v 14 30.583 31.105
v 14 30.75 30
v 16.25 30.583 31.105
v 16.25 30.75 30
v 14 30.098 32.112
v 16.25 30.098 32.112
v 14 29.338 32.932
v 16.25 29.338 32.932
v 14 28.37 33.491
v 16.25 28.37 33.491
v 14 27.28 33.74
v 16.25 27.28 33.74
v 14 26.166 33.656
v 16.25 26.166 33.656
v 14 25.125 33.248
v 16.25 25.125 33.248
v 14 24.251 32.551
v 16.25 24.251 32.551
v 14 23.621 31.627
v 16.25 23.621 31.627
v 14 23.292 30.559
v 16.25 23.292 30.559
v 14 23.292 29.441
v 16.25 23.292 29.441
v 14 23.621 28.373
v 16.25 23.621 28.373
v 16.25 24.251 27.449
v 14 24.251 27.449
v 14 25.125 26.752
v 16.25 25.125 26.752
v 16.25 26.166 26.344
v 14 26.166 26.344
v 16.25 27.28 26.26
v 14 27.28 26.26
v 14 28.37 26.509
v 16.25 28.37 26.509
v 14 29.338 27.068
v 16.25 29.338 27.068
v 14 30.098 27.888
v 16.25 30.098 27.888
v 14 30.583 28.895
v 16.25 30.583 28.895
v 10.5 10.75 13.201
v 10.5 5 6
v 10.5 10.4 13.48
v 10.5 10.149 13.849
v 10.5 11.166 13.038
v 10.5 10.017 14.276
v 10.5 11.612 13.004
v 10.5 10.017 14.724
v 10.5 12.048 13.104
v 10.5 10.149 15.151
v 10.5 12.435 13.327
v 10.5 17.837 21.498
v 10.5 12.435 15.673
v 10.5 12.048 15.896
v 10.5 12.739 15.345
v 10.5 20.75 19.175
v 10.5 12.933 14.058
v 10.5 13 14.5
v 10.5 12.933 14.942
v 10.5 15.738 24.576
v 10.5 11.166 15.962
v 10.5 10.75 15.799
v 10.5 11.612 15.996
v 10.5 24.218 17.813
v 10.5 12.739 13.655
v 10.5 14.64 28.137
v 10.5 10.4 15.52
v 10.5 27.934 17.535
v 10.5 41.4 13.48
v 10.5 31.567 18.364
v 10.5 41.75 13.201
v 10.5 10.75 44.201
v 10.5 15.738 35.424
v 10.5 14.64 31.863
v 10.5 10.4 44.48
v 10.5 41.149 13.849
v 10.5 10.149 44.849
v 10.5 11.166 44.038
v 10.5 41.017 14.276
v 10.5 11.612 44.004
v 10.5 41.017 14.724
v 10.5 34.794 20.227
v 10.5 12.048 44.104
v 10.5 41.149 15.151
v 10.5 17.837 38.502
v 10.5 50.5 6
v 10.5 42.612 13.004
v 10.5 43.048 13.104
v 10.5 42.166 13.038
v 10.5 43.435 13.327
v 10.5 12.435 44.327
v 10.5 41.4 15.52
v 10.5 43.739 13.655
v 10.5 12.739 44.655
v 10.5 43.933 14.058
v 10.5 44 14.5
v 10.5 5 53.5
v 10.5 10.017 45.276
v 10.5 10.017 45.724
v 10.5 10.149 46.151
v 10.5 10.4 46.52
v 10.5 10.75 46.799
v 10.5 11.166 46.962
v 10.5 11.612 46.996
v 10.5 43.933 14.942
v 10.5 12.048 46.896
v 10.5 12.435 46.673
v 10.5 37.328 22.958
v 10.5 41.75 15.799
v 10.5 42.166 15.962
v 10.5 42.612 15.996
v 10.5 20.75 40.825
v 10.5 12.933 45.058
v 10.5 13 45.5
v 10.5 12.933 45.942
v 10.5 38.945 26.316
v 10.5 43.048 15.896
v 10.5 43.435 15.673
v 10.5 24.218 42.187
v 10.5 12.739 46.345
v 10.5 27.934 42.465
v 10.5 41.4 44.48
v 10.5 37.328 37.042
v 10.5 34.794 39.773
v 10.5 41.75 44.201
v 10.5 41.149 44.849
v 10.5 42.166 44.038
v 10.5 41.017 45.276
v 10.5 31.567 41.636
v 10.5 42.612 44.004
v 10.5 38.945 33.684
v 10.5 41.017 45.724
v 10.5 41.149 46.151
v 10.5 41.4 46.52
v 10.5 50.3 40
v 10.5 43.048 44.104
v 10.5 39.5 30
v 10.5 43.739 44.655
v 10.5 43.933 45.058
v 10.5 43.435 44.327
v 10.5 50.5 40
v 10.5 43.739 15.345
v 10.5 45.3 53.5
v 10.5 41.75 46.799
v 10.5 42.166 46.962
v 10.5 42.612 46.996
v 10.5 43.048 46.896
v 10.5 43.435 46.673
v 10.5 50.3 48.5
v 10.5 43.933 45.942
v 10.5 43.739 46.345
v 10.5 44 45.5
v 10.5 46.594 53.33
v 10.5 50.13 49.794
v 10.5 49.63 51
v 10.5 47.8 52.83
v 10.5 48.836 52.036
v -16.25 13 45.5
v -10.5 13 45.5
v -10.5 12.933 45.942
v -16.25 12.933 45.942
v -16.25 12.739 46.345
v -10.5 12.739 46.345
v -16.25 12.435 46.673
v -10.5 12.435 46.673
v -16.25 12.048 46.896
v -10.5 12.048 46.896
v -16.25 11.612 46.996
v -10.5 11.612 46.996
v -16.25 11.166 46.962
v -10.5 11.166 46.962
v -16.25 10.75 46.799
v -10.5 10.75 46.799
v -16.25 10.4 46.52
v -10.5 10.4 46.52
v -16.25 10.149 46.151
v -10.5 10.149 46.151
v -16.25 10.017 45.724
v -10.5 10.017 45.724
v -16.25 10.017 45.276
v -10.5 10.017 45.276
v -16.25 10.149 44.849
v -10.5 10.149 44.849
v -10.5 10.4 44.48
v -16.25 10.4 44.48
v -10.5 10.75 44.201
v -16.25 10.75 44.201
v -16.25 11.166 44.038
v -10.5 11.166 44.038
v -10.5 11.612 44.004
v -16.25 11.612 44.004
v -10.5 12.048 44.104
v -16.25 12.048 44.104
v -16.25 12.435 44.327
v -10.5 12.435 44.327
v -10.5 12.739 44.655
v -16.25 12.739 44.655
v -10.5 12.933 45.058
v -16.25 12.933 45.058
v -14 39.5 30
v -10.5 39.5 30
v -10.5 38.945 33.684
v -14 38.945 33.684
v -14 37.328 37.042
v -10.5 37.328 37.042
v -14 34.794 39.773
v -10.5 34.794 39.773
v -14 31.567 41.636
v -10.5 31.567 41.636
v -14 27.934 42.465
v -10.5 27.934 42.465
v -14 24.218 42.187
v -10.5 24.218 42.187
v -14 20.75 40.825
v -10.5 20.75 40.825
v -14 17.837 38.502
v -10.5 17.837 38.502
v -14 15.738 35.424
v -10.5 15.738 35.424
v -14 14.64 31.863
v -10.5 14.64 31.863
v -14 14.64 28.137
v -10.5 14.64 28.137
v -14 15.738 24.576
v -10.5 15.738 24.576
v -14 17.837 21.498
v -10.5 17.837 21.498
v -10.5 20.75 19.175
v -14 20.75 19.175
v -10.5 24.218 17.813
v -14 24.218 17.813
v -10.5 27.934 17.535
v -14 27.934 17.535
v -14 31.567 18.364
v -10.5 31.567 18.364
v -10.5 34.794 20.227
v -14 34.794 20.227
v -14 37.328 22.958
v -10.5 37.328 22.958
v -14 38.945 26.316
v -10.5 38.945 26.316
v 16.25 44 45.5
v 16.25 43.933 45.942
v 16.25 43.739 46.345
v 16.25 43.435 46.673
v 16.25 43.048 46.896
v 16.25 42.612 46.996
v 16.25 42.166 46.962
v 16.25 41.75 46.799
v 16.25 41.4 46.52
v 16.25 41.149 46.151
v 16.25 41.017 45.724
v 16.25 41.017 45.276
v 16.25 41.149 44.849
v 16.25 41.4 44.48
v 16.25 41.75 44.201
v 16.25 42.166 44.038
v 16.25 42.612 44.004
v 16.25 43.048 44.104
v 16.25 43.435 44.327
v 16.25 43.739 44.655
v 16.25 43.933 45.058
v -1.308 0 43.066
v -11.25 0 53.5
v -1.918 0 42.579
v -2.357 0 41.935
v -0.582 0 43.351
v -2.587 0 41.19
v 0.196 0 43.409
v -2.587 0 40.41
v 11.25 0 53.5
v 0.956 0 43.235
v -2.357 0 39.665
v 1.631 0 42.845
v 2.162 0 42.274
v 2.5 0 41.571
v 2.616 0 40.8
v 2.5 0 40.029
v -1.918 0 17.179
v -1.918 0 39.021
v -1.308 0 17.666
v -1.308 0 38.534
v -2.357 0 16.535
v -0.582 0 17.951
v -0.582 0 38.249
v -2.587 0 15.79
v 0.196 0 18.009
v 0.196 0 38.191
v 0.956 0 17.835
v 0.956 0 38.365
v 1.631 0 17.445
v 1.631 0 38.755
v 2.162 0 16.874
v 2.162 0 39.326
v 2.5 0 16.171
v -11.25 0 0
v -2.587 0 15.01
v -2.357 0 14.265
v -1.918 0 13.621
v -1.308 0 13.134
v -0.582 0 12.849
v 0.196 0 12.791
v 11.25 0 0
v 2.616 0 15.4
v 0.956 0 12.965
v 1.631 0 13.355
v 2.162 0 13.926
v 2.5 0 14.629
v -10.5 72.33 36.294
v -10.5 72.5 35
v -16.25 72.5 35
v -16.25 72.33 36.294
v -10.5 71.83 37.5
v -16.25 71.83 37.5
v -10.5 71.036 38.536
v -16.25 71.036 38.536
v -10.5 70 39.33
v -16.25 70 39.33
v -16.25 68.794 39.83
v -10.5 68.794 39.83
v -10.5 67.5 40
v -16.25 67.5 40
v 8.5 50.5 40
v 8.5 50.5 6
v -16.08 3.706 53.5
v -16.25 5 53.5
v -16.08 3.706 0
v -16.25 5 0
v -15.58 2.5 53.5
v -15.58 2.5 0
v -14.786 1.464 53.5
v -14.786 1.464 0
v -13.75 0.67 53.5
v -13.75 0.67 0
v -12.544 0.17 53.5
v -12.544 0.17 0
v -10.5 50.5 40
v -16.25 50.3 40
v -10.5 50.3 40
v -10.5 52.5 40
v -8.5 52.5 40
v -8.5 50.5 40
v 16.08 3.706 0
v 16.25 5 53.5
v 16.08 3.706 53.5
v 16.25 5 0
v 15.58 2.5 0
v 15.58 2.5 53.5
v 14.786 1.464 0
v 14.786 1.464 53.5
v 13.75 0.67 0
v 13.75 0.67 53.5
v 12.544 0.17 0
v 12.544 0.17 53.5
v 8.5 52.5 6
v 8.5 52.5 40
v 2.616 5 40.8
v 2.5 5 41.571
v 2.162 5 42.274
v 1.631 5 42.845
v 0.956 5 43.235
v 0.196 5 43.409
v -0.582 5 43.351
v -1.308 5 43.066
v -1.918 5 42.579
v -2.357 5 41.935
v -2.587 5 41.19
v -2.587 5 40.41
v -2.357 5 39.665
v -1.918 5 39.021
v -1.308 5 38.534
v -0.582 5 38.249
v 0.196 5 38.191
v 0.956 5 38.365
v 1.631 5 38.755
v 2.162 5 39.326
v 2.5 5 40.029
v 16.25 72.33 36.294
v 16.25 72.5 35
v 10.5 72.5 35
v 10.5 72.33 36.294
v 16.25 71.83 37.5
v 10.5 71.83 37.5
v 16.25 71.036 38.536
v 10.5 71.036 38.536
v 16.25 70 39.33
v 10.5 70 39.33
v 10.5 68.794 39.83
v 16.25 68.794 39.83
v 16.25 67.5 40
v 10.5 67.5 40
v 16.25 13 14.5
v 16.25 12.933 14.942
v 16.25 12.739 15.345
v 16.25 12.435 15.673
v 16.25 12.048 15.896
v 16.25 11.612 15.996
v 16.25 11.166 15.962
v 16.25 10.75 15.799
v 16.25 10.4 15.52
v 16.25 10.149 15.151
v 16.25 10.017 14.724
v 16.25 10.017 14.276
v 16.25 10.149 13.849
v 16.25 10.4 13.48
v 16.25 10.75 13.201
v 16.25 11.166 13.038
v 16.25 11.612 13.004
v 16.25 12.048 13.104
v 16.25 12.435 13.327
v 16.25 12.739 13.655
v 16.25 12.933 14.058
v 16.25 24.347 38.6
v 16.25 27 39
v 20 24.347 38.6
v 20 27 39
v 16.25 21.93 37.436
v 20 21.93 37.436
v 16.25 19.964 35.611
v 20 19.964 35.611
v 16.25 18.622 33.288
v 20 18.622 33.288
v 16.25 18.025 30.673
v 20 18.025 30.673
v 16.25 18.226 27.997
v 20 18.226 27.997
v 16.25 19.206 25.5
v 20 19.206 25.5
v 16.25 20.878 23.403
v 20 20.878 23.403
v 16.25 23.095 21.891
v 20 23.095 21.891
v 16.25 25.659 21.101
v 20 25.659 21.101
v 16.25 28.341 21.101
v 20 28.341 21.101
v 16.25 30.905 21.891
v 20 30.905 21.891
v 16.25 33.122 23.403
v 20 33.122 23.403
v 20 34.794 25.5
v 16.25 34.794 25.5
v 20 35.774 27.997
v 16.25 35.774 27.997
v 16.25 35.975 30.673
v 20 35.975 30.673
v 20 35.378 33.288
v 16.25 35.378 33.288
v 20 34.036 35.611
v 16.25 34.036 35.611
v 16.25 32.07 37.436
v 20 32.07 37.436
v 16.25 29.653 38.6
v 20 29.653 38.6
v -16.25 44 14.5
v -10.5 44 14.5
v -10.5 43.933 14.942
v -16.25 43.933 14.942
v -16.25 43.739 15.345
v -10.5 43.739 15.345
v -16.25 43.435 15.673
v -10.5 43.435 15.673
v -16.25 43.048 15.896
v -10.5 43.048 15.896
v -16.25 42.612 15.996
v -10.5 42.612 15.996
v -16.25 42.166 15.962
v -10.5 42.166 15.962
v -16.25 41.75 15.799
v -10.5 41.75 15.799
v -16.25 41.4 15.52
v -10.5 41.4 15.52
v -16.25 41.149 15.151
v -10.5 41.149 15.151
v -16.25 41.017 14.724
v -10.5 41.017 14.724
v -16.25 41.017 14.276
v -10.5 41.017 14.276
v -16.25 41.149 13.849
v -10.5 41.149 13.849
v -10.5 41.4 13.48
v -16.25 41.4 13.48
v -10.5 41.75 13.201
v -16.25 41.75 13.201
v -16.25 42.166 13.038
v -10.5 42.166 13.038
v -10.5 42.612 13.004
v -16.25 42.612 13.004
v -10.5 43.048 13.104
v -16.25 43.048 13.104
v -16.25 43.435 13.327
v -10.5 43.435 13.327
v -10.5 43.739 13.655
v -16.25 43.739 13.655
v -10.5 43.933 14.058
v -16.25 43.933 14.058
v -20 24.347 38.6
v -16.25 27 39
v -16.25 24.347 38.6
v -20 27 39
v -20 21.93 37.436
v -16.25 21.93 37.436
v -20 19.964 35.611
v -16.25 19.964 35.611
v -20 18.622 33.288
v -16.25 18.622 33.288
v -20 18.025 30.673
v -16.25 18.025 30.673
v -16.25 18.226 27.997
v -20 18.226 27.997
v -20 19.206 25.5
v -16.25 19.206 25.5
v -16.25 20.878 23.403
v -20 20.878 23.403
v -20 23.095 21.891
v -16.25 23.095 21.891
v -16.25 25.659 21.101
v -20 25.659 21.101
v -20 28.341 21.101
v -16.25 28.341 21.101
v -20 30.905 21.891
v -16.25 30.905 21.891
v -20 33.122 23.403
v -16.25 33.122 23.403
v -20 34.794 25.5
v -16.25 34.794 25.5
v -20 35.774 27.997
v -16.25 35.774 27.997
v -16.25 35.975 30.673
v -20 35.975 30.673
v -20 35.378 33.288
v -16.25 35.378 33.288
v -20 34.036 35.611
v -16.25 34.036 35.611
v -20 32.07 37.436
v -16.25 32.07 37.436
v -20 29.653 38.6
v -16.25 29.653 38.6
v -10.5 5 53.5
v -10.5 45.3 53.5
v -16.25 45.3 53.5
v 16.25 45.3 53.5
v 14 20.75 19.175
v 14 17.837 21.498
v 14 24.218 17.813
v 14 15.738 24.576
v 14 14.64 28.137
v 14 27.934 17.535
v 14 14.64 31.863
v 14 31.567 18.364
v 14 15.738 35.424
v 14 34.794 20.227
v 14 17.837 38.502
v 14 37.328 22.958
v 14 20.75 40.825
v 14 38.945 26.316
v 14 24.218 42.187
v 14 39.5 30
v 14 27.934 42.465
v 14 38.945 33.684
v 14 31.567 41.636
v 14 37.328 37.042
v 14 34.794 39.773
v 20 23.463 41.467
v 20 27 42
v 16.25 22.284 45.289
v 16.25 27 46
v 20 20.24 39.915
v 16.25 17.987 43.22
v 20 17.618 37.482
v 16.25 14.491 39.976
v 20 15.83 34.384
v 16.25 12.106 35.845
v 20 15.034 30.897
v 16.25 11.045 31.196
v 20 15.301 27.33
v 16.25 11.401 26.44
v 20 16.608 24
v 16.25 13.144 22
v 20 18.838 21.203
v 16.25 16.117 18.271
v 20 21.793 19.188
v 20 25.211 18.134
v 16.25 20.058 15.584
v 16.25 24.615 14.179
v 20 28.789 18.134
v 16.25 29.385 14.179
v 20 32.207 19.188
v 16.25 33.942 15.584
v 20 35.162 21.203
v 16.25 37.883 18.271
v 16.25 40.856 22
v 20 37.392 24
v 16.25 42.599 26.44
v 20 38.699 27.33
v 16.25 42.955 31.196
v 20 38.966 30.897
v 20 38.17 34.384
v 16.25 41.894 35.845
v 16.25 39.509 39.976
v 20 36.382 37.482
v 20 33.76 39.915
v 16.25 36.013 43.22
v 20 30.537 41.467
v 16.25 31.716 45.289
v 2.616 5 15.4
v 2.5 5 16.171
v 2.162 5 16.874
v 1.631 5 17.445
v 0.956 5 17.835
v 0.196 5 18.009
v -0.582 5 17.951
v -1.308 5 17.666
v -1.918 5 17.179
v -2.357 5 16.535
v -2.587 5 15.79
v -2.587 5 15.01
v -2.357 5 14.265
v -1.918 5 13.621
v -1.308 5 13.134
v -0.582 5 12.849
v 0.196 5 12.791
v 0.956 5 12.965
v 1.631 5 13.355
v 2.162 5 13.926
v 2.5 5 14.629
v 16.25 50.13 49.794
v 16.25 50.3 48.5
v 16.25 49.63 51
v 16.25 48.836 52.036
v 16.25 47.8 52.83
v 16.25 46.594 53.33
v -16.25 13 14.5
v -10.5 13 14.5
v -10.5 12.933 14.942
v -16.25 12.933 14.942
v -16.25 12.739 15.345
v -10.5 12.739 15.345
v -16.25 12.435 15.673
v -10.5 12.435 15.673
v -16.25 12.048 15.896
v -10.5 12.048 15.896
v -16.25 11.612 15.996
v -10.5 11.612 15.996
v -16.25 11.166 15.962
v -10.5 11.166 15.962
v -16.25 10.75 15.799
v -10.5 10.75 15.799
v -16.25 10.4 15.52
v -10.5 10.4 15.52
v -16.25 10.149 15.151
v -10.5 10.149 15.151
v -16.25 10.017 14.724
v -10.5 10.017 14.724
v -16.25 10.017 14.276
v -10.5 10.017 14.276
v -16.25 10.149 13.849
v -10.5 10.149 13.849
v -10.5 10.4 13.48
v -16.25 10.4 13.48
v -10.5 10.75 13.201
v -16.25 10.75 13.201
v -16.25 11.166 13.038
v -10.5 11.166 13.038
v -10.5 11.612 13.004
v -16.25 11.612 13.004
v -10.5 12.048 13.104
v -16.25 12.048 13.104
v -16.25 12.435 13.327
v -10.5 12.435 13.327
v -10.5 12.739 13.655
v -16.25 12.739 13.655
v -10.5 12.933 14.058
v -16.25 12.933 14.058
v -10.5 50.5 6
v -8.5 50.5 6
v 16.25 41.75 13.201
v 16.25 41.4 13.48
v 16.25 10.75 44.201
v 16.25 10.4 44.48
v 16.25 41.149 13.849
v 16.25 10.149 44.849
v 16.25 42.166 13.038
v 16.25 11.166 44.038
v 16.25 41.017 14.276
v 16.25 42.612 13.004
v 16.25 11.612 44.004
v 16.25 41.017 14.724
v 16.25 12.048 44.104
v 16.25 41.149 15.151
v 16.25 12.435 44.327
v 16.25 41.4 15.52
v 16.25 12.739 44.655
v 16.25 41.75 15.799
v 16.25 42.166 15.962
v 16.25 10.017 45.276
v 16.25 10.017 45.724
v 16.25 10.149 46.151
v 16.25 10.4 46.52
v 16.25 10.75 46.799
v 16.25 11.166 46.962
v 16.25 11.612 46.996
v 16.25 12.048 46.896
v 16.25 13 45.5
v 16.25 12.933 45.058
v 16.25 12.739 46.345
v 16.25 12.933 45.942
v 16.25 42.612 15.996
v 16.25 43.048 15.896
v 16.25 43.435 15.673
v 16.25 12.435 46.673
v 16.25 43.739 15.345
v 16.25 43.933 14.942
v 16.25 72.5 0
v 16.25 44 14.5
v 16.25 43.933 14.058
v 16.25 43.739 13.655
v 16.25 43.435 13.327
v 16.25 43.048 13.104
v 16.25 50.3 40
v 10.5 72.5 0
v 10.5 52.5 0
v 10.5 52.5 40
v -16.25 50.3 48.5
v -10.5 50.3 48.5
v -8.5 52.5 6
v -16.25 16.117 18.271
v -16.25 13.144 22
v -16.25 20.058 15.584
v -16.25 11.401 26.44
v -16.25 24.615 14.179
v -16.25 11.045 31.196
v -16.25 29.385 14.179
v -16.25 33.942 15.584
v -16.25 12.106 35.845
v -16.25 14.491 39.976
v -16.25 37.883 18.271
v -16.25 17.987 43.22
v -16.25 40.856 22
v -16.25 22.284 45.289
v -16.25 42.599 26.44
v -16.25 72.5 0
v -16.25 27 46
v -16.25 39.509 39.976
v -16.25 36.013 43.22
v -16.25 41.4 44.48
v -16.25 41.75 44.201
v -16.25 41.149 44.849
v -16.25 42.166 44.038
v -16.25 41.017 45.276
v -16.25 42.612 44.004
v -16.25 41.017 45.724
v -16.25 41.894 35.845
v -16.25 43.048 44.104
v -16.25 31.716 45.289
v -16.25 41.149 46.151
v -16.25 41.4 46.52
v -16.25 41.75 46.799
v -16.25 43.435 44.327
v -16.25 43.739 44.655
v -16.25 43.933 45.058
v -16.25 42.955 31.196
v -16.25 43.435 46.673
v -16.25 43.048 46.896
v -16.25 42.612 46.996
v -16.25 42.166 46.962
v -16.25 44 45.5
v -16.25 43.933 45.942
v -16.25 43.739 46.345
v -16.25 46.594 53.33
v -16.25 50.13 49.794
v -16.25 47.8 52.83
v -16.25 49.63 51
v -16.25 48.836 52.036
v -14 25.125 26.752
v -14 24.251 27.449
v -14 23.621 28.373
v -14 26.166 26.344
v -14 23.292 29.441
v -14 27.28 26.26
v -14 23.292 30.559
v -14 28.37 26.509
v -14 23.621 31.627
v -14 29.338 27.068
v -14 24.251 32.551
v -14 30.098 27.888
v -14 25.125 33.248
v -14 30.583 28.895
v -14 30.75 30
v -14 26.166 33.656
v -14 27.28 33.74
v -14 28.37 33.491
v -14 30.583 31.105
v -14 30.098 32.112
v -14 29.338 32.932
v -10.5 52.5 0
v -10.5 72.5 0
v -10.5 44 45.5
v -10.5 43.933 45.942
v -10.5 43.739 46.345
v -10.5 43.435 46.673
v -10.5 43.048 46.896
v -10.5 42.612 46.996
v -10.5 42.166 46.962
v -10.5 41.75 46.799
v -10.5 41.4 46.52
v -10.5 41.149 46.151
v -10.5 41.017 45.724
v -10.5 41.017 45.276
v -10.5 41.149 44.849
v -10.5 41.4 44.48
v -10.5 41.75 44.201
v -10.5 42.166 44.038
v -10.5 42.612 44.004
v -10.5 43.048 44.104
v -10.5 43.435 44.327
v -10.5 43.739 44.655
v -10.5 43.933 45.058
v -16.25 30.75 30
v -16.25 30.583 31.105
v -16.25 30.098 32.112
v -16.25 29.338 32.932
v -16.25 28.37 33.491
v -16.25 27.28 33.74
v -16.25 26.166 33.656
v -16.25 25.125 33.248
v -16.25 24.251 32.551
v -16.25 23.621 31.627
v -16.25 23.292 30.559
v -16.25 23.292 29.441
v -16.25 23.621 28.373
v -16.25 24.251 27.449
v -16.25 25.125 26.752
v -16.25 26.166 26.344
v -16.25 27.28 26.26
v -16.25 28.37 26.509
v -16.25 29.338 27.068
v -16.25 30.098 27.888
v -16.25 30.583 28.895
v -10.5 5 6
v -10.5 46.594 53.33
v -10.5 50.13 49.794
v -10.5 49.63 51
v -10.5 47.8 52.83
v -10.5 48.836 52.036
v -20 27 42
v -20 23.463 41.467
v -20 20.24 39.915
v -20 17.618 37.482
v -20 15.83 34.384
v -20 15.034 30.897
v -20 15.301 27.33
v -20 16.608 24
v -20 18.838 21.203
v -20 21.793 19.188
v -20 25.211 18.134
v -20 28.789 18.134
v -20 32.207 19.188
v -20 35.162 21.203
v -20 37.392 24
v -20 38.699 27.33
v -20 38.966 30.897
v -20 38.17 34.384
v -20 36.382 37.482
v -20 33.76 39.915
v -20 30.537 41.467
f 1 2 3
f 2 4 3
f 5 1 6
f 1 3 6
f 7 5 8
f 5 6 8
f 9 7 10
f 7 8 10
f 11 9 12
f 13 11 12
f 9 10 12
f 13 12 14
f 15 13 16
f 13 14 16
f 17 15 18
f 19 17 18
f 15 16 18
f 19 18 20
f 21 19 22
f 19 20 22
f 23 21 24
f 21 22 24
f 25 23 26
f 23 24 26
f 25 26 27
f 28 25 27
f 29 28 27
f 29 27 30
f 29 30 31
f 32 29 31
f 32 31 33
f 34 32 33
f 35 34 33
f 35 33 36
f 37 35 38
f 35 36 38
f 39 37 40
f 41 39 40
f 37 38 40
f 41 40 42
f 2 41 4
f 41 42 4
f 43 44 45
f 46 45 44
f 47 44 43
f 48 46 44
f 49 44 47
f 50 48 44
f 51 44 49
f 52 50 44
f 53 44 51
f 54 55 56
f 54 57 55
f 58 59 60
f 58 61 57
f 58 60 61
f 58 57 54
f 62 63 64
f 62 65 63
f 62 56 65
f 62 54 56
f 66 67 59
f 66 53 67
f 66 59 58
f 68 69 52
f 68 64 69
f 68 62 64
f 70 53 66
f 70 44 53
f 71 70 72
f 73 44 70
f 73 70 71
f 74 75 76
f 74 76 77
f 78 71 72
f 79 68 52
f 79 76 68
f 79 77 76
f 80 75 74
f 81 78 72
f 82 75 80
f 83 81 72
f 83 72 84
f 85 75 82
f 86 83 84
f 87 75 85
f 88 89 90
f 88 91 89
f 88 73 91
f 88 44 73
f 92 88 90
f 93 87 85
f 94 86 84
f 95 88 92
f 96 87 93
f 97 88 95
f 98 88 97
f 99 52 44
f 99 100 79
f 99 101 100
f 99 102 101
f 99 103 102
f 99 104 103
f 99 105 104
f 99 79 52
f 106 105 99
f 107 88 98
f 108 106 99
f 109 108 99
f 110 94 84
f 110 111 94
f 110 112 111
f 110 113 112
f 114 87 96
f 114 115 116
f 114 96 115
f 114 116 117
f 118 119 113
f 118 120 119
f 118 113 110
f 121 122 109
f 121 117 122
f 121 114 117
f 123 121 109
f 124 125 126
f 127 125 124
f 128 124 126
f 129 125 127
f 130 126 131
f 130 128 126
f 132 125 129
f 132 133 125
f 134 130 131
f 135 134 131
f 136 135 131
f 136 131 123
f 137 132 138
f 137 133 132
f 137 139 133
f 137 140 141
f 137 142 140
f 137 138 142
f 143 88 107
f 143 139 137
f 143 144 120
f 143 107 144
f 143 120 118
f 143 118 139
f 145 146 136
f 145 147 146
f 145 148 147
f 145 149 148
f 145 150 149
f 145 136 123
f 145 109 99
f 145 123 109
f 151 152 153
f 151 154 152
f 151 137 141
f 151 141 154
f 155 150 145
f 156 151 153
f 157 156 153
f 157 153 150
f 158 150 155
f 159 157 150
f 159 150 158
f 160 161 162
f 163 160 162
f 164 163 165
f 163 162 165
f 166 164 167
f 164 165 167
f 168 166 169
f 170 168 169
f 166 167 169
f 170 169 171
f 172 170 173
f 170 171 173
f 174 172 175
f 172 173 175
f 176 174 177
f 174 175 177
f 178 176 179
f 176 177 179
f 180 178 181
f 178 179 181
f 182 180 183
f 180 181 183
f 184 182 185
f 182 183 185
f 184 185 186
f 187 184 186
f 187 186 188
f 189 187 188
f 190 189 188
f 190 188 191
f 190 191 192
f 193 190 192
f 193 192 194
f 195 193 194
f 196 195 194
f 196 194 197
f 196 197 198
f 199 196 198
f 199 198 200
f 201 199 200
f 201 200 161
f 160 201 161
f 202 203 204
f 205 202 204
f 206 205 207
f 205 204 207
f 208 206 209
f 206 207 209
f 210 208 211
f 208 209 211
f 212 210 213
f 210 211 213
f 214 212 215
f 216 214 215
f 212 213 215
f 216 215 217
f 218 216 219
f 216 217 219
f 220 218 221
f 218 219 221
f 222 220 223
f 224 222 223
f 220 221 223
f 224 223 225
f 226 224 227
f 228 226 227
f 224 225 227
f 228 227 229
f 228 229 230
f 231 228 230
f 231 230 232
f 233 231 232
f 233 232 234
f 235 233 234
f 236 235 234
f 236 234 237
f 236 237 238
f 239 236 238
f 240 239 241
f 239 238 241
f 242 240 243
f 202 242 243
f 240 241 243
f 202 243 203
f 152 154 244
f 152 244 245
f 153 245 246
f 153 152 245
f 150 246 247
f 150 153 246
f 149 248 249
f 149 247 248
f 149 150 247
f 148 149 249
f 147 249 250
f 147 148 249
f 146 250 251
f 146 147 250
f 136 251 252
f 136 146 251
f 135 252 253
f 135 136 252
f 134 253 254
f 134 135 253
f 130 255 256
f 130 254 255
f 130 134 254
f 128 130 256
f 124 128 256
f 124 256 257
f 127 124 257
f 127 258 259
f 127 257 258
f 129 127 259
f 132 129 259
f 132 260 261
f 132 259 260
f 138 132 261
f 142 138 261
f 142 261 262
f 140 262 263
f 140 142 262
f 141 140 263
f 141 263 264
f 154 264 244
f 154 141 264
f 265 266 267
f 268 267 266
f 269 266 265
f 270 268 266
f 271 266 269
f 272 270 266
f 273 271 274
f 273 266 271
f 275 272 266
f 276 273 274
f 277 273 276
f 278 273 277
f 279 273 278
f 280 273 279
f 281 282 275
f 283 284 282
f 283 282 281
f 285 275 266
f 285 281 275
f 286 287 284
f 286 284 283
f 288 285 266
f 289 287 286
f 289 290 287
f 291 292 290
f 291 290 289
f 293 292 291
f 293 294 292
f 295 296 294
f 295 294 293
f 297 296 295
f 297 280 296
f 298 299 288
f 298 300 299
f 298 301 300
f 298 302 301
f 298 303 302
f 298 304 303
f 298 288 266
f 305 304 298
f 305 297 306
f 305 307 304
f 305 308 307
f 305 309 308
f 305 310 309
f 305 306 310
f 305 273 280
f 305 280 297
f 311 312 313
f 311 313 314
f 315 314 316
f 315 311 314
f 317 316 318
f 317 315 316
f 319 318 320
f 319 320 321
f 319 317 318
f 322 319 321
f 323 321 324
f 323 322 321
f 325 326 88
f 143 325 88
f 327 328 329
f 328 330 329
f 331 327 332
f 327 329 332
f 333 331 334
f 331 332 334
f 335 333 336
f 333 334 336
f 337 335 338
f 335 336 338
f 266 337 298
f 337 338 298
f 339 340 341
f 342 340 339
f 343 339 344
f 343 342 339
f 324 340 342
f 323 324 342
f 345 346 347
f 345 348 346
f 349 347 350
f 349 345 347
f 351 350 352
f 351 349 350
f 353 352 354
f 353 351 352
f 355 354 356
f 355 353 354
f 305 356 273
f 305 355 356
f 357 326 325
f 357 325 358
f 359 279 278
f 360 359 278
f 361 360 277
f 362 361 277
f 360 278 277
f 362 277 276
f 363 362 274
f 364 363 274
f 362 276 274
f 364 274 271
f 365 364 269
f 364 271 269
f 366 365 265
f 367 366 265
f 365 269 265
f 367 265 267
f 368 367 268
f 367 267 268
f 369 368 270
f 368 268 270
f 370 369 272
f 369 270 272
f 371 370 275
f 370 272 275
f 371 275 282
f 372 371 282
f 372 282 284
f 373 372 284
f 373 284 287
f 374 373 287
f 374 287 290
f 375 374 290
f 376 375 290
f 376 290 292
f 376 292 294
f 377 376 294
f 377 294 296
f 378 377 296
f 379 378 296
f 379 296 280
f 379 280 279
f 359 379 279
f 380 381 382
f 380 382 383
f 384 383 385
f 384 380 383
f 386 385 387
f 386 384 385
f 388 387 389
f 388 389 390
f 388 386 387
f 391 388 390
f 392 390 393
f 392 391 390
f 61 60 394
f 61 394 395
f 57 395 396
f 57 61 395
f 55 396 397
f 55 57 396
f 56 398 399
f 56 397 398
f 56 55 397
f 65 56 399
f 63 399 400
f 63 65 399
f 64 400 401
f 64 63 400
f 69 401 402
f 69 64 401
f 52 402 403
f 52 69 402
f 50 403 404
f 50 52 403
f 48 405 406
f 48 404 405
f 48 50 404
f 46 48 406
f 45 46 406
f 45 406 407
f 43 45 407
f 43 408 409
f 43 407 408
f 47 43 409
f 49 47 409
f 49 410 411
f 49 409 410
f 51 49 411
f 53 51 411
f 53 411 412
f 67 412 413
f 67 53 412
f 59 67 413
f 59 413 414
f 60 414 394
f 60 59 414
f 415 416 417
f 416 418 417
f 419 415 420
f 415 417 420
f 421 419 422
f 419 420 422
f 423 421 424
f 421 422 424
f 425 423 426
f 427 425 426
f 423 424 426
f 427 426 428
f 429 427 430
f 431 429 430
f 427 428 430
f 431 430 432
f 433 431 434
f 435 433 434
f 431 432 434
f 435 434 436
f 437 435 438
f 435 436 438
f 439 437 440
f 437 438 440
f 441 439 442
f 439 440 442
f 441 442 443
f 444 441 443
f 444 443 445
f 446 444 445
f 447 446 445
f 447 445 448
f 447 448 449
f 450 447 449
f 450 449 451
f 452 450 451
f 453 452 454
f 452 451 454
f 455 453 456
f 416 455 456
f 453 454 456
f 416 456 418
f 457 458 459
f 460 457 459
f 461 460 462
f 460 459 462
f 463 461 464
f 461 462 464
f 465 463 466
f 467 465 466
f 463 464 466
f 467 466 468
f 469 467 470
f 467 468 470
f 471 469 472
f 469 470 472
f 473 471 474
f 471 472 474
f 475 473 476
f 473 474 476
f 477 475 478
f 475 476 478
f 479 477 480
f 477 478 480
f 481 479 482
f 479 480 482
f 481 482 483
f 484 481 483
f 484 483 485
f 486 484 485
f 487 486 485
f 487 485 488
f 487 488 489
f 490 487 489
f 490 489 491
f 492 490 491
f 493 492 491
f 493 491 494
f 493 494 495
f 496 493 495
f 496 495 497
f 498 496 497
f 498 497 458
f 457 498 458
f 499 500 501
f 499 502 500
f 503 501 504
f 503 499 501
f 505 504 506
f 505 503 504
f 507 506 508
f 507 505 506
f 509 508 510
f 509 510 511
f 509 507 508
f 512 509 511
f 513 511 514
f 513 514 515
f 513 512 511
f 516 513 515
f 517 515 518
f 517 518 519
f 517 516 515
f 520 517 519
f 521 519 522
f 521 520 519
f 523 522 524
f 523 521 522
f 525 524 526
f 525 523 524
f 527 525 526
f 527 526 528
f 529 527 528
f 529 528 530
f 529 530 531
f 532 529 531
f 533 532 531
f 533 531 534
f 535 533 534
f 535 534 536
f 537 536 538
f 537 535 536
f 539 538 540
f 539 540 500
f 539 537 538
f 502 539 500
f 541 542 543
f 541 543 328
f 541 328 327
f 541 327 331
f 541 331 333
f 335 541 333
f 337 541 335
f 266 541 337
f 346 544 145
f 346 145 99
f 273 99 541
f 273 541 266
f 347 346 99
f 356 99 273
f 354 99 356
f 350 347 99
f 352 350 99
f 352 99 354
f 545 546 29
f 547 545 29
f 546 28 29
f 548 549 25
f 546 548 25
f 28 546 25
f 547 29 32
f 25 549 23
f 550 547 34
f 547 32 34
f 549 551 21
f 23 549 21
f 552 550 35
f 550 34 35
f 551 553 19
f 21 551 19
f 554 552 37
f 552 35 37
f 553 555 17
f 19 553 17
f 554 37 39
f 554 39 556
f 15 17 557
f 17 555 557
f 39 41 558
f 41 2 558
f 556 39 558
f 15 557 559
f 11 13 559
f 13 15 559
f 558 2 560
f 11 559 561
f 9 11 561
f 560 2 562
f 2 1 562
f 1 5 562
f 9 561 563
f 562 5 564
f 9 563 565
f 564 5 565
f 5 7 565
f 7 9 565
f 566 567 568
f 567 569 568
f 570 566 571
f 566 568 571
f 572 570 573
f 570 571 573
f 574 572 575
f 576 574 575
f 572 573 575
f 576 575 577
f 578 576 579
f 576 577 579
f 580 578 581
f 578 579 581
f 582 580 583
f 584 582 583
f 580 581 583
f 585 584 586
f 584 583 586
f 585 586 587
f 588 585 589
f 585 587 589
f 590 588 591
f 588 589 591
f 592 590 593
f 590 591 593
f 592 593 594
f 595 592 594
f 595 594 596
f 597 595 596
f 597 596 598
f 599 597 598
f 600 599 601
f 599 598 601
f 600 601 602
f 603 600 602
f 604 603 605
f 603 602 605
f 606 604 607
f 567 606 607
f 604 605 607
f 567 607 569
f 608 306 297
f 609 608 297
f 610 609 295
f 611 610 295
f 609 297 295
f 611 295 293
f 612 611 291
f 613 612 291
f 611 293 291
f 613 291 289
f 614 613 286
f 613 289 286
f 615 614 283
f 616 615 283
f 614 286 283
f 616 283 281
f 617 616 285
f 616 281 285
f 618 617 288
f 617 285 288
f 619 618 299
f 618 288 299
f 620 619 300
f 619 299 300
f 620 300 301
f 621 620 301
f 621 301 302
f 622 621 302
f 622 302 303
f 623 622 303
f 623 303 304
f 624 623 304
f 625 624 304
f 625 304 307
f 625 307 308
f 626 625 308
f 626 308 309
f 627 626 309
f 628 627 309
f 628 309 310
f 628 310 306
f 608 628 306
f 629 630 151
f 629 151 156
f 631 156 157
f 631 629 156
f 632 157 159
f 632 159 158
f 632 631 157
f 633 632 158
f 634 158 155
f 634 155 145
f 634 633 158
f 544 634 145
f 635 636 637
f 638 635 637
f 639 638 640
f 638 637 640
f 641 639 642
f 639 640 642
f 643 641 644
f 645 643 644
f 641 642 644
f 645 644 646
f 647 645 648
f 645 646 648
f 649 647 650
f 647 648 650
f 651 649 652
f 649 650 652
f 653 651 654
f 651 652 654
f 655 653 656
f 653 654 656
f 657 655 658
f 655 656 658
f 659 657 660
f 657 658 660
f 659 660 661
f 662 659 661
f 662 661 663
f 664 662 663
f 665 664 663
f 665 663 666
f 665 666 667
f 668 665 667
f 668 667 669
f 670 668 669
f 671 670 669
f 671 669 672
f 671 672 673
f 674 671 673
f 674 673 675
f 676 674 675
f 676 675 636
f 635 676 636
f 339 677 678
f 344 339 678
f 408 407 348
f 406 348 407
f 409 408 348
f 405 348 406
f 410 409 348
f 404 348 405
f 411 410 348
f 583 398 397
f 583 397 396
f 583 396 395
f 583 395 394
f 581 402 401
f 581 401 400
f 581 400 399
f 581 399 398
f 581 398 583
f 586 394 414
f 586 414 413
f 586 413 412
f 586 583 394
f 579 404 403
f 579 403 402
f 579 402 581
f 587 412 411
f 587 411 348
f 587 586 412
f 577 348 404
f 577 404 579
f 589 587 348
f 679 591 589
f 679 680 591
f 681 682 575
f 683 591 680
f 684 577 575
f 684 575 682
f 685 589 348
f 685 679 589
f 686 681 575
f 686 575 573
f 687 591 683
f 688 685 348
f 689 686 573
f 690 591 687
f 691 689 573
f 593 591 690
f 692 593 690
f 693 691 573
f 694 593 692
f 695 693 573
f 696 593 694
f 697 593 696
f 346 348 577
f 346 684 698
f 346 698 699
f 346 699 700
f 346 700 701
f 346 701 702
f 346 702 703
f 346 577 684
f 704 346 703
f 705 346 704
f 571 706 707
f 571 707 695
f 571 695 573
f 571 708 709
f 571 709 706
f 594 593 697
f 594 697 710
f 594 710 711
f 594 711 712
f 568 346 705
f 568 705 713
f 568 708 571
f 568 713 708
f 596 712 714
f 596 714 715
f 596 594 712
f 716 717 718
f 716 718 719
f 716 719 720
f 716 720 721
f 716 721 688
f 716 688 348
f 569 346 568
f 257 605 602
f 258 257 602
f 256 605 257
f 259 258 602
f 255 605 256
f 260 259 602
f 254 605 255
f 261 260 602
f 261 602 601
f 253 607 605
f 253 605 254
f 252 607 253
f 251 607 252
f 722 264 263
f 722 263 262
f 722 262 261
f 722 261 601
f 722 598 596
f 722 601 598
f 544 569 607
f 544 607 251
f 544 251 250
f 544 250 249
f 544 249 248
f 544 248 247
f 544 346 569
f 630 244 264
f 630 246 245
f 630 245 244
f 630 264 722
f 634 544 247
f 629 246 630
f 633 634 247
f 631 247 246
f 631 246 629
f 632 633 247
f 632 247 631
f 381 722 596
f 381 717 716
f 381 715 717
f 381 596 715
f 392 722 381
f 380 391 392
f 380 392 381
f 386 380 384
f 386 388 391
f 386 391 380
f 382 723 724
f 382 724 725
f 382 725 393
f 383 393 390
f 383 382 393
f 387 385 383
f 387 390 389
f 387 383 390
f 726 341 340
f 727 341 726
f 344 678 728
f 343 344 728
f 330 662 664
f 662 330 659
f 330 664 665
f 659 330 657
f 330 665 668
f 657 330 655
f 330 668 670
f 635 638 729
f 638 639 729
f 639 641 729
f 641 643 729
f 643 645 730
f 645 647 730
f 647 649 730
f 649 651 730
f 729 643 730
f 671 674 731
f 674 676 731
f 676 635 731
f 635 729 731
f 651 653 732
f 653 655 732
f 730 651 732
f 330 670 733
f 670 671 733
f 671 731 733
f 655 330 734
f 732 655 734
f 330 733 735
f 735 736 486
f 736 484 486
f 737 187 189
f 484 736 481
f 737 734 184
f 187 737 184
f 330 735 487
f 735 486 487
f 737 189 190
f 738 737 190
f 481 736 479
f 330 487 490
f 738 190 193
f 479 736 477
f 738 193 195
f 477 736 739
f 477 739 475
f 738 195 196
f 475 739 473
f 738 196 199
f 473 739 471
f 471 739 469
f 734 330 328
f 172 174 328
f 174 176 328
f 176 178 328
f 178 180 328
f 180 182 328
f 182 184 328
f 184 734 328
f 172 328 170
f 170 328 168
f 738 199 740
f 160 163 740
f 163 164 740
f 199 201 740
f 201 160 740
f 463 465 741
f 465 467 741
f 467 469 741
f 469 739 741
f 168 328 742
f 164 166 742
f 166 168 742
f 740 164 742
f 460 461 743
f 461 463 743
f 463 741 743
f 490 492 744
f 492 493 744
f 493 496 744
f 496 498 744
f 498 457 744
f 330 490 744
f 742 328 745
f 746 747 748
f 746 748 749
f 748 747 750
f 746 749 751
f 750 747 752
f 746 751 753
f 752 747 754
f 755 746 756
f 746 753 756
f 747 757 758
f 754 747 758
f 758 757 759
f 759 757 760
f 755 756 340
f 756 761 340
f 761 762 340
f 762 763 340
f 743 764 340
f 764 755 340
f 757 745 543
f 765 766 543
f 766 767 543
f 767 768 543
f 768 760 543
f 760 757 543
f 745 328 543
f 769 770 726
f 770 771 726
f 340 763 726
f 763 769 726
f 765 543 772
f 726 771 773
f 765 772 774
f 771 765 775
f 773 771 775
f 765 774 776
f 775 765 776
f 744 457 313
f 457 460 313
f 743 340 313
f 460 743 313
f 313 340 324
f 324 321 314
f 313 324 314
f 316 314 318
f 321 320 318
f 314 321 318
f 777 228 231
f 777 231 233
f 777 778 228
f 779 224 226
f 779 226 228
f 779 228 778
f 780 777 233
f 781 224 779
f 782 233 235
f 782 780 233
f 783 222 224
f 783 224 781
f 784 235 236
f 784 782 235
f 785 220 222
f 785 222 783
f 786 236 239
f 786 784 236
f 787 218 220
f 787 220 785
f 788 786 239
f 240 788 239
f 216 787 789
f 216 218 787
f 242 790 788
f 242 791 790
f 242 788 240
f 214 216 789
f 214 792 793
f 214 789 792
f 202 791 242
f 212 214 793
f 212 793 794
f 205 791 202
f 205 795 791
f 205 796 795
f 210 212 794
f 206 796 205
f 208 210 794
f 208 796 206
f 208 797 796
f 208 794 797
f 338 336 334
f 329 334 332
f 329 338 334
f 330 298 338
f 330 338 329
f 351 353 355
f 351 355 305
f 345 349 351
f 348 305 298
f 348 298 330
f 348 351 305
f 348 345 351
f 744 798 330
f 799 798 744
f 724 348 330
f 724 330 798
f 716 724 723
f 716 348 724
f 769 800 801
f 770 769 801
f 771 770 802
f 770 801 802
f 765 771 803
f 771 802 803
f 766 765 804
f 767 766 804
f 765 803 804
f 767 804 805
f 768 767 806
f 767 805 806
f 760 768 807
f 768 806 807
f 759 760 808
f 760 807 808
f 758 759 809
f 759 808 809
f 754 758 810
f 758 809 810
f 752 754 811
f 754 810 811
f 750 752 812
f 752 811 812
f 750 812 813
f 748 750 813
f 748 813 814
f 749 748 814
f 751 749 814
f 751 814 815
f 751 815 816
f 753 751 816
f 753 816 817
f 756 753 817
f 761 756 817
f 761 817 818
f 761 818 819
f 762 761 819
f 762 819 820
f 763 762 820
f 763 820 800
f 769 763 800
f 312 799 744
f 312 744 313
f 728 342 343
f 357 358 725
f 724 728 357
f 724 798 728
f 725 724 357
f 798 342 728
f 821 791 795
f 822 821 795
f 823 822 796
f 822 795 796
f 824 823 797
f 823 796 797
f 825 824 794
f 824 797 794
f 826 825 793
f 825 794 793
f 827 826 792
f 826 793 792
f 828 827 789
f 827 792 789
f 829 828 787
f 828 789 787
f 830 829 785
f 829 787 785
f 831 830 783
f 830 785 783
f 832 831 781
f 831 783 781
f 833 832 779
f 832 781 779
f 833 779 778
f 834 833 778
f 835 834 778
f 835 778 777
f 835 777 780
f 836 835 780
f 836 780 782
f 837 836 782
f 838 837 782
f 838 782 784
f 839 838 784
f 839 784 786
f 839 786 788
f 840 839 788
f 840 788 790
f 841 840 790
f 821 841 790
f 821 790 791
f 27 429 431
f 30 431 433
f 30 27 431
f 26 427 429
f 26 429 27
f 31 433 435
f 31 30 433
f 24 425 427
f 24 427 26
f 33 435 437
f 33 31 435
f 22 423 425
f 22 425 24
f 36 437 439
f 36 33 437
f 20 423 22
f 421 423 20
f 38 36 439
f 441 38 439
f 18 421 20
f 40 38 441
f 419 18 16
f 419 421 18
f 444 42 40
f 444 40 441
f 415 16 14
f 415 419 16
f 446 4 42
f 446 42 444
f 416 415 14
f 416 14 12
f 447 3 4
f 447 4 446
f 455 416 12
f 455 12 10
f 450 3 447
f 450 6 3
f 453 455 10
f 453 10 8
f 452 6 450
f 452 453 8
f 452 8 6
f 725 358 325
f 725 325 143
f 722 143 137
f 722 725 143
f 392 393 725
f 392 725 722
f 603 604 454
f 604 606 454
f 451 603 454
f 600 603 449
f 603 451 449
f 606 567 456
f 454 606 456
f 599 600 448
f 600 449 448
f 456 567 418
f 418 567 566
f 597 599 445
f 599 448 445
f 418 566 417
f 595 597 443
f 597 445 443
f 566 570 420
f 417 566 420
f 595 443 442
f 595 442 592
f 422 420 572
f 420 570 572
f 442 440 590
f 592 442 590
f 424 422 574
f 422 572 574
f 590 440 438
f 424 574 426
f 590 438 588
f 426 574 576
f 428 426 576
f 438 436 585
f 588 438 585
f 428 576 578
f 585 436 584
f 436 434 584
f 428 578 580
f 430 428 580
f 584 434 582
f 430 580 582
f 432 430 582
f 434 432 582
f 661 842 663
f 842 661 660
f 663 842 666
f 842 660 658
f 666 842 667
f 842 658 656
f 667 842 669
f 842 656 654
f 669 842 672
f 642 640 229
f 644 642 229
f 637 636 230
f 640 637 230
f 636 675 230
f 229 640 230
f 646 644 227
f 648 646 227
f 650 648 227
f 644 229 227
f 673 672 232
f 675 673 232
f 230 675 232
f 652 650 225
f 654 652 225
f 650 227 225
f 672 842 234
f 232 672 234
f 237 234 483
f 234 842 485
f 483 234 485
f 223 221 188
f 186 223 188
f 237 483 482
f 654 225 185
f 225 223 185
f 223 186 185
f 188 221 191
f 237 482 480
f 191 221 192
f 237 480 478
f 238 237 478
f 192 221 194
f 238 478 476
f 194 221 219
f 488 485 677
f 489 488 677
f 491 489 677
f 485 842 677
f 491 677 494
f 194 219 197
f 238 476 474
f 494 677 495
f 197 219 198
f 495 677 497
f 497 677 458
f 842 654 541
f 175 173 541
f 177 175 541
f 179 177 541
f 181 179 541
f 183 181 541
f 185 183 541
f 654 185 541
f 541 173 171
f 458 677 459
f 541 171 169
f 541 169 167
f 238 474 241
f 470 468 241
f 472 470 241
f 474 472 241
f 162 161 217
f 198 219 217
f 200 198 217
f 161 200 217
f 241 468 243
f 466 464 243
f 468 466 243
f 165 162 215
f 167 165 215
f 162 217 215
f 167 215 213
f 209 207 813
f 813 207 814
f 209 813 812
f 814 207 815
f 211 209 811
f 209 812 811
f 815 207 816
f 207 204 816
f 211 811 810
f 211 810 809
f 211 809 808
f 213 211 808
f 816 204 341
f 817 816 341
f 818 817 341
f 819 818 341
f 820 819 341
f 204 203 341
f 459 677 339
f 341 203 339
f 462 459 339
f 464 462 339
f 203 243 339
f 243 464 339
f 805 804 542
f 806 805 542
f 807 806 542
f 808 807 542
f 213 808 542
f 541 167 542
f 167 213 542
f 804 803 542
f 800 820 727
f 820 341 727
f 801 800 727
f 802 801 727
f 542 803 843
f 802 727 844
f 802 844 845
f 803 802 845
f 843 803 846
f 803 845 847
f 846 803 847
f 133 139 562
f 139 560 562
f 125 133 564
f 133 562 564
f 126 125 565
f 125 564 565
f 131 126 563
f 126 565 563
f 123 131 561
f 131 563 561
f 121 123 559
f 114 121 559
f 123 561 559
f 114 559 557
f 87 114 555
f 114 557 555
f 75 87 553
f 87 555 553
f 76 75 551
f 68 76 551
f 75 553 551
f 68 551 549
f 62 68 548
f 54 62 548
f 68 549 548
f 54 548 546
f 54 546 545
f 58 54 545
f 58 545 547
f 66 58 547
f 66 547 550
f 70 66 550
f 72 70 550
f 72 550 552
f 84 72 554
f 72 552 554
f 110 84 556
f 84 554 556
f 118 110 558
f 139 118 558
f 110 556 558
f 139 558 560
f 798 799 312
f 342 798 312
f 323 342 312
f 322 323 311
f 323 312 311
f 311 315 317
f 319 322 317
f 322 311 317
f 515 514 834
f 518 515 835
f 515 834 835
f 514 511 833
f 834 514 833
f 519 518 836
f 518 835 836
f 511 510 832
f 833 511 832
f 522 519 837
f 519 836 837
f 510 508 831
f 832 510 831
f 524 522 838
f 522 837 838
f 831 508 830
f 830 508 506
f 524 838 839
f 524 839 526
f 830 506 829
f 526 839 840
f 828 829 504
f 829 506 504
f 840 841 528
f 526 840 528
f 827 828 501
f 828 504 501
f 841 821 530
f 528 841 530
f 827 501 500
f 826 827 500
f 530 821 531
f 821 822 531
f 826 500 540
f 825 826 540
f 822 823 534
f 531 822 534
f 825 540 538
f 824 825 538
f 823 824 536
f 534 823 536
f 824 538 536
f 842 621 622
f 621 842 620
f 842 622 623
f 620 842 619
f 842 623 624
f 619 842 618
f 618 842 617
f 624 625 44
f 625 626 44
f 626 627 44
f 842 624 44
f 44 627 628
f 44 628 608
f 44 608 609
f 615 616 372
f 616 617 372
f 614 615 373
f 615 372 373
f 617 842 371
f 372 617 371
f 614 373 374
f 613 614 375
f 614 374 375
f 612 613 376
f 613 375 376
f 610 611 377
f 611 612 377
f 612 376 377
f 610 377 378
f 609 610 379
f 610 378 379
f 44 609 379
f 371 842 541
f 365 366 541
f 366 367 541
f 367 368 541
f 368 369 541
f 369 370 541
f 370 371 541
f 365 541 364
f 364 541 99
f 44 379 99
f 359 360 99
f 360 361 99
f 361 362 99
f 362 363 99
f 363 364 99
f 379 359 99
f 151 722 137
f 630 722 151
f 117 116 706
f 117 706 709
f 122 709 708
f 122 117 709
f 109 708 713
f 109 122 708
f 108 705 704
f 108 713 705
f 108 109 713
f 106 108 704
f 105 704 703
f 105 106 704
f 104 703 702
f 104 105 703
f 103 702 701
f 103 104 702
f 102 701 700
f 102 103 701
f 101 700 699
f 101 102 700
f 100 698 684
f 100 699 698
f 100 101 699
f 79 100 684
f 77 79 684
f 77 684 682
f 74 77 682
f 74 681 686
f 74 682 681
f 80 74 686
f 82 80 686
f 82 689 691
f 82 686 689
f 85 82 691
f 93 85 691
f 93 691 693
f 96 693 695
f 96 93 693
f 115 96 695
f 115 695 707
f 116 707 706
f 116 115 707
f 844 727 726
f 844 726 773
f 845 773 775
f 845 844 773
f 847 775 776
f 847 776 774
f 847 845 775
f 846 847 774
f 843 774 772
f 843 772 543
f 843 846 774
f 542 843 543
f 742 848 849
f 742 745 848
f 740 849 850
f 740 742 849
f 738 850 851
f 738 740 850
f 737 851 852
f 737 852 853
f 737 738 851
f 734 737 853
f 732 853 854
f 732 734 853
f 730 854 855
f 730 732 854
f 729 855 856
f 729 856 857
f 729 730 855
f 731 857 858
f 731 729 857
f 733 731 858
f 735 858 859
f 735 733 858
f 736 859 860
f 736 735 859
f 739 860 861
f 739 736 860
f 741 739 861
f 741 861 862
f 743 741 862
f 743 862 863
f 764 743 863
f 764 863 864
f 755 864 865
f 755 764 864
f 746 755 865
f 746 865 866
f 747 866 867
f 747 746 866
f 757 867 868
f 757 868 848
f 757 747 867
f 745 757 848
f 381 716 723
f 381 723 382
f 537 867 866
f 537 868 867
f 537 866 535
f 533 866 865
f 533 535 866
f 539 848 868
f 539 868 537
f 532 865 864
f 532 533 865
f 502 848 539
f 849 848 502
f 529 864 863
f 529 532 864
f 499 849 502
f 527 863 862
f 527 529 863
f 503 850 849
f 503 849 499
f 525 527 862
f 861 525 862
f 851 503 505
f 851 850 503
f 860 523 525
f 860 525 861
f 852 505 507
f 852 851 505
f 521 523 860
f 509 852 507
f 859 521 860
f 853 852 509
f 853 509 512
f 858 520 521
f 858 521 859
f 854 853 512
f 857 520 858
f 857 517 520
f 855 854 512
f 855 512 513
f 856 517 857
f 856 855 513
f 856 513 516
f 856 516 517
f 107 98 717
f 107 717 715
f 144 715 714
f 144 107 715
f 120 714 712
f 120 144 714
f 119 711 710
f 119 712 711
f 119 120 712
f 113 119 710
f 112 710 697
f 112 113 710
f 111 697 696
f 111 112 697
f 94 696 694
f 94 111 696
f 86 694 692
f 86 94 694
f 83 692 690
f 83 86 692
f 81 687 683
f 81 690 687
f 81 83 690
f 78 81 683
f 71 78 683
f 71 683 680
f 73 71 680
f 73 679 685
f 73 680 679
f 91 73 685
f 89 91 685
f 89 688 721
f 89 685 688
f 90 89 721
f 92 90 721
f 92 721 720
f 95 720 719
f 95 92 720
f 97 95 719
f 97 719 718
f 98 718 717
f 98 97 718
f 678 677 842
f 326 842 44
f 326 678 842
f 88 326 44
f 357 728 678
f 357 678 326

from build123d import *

# Parameters (mm, degrees)
F1_DEPTH       = 16.25
F2_R           = 3.75
F3_DEPTH       = 16.251
F3_DEPTH_BACK  = 16.251
F4_W           = 21
F4_H           = 67.5
F5_DEPTH       = 47.5
F10_W          = 21
F10_H          = 6
F11_DEPTH      = 20
F12_W          = 2
F12_H          = 2
F13_DEPTH      = 34
F14_R          = 12.5
F15_DEPTH      = 14
F16_R          = 5
F17_R          = 1.5
F18_DEPTH      = 20.001
F18_DEPTH_BACK = 20.001
F19_R          = 2.6162
F20_DEPTH      = 25


with BuildPart() as f1:
    # F0 (on Right) → F1 (new body, symmetric)
    with BuildSketch(Plane.YZ):
        with BuildLine():
            Line((0, 53.5), (0, 0))
            Line((0, 0), (72.5, 0))
            Line((72.5, 0), (72.5, 35))
            ThreePointArc((72.5, 35), (71.0355339059, 38.5355339059), (67.5, 40))
            Line((67.5, 40), (50.3, 40))
            Line((50.3, 40), (50.3, 48.5))
            ThreePointArc((50.3, 48.5), (48.8355339059, 52.0355339059), (45.3, 53.5))
            Line((45.3, 53.5), (0, 53.5))
        make_face()
    extrude(amount=F1_DEPTH, both=True)

    # F2 (on Right) → F3 (cut, two sides)
    with BuildSketch(Plane.YZ) as f3_sk:
        with Locations((27, 30)):
            Circle(F2_R)
    extrude(amount=-F3_DEPTH, mode=Mode.SUBTRACT)
    extrude(f3_sk.sketch, amount=F3_DEPTH_BACK, mode=Mode.SUBTRACT)

    # F4 (on face) → F5 (cut)
    with BuildSketch(Plane.XY.offset(53.5)):
        with Locations((0, 38.75)):
            Rectangle(F4_W, F4_H)
    extrude(amount=-F5_DEPTH, mode=Mode.SUBTRACT)

    # F7 (on offset) → F8 (revolve)
    with BuildSketch(Plane.XZ.offset(-27)):
        Polygon((20, 42), (16.25, 46), (16.25, 39), (20, 39), align=None)
    revolve(axis=Axis((16.25, 27, 30), (1, 0, 0)))

    # F9: F1 across plane


with BuildPart() as f1_1:
    add(f1.part)
    add(f1.part.mirror(Plane.YZ))

    # F10 (on face) → F11 (cut)
    with BuildSketch(Plane(origin=(0, 72.5, 0), x_dir=(-1, 0, 0), z_dir=(0, 1, 0))):
        with Locations((0, 3)):
            Rectangle(F10_W, F10_H)
    extrude(amount=-F11_DEPTH, mode=Mode.SUBTRACT)

    # F12 (on face) → F13 (join, through all)
    with BuildSketch(Plane.XY.offset(6)):
        with Locations((-9.5, 51.5)):
            Rectangle(F12_W, F12_H)
        with Locations((9.5, 51.5)):
            Rectangle(F12_W, F12_H)
    extrude(amount=F13_DEPTH)

    # F14 (on Right) → F15 (cut, symmetric)
    with BuildSketch(Plane.YZ):
        with Locations((27, 30)):
            Circle(F14_R)
    extrude(amount=F15_DEPTH, both=True, mode=Mode.SUBTRACT)

    # F16
    f16_edges = [f1_1.edges().sort_by_distance(p)[0] for p in [
        (16.25, 0, 26.75),
        (-16.25, 0, 26.75),
    ]]
    fillet(f16_edges, radius=F16_R)

    # F17 (on Right) → F18 (cut, two sides)
    with BuildSketch(Plane.YZ) as f18_sk:
        with Locations((11.5, 45.5)):
            Circle(F17_R)
        with Locations((11.5, 14.5)):
            Circle(F17_R)
        with Locations((42.5, 14.5)):
            Circle(F17_R)
        with Locations((42.5, 45.5)):
            Circle(F17_R)
    extrude(amount=-F18_DEPTH, mode=Mode.SUBTRACT)
    extrude(f18_sk.sketch, amount=F18_DEPTH_BACK, mode=Mode.SUBTRACT)

    # F19 (on face) → F20 (cut)
    with BuildSketch(Plane.XZ):
        with Locations((0, 40.8)):
            Circle(F19_R)
        with Locations((0, 15.4)):
            Circle(F19_R)
    extrude(amount=-F20_DEPTH, mode=Mode.SUBTRACT)


solid = f1_1.part
